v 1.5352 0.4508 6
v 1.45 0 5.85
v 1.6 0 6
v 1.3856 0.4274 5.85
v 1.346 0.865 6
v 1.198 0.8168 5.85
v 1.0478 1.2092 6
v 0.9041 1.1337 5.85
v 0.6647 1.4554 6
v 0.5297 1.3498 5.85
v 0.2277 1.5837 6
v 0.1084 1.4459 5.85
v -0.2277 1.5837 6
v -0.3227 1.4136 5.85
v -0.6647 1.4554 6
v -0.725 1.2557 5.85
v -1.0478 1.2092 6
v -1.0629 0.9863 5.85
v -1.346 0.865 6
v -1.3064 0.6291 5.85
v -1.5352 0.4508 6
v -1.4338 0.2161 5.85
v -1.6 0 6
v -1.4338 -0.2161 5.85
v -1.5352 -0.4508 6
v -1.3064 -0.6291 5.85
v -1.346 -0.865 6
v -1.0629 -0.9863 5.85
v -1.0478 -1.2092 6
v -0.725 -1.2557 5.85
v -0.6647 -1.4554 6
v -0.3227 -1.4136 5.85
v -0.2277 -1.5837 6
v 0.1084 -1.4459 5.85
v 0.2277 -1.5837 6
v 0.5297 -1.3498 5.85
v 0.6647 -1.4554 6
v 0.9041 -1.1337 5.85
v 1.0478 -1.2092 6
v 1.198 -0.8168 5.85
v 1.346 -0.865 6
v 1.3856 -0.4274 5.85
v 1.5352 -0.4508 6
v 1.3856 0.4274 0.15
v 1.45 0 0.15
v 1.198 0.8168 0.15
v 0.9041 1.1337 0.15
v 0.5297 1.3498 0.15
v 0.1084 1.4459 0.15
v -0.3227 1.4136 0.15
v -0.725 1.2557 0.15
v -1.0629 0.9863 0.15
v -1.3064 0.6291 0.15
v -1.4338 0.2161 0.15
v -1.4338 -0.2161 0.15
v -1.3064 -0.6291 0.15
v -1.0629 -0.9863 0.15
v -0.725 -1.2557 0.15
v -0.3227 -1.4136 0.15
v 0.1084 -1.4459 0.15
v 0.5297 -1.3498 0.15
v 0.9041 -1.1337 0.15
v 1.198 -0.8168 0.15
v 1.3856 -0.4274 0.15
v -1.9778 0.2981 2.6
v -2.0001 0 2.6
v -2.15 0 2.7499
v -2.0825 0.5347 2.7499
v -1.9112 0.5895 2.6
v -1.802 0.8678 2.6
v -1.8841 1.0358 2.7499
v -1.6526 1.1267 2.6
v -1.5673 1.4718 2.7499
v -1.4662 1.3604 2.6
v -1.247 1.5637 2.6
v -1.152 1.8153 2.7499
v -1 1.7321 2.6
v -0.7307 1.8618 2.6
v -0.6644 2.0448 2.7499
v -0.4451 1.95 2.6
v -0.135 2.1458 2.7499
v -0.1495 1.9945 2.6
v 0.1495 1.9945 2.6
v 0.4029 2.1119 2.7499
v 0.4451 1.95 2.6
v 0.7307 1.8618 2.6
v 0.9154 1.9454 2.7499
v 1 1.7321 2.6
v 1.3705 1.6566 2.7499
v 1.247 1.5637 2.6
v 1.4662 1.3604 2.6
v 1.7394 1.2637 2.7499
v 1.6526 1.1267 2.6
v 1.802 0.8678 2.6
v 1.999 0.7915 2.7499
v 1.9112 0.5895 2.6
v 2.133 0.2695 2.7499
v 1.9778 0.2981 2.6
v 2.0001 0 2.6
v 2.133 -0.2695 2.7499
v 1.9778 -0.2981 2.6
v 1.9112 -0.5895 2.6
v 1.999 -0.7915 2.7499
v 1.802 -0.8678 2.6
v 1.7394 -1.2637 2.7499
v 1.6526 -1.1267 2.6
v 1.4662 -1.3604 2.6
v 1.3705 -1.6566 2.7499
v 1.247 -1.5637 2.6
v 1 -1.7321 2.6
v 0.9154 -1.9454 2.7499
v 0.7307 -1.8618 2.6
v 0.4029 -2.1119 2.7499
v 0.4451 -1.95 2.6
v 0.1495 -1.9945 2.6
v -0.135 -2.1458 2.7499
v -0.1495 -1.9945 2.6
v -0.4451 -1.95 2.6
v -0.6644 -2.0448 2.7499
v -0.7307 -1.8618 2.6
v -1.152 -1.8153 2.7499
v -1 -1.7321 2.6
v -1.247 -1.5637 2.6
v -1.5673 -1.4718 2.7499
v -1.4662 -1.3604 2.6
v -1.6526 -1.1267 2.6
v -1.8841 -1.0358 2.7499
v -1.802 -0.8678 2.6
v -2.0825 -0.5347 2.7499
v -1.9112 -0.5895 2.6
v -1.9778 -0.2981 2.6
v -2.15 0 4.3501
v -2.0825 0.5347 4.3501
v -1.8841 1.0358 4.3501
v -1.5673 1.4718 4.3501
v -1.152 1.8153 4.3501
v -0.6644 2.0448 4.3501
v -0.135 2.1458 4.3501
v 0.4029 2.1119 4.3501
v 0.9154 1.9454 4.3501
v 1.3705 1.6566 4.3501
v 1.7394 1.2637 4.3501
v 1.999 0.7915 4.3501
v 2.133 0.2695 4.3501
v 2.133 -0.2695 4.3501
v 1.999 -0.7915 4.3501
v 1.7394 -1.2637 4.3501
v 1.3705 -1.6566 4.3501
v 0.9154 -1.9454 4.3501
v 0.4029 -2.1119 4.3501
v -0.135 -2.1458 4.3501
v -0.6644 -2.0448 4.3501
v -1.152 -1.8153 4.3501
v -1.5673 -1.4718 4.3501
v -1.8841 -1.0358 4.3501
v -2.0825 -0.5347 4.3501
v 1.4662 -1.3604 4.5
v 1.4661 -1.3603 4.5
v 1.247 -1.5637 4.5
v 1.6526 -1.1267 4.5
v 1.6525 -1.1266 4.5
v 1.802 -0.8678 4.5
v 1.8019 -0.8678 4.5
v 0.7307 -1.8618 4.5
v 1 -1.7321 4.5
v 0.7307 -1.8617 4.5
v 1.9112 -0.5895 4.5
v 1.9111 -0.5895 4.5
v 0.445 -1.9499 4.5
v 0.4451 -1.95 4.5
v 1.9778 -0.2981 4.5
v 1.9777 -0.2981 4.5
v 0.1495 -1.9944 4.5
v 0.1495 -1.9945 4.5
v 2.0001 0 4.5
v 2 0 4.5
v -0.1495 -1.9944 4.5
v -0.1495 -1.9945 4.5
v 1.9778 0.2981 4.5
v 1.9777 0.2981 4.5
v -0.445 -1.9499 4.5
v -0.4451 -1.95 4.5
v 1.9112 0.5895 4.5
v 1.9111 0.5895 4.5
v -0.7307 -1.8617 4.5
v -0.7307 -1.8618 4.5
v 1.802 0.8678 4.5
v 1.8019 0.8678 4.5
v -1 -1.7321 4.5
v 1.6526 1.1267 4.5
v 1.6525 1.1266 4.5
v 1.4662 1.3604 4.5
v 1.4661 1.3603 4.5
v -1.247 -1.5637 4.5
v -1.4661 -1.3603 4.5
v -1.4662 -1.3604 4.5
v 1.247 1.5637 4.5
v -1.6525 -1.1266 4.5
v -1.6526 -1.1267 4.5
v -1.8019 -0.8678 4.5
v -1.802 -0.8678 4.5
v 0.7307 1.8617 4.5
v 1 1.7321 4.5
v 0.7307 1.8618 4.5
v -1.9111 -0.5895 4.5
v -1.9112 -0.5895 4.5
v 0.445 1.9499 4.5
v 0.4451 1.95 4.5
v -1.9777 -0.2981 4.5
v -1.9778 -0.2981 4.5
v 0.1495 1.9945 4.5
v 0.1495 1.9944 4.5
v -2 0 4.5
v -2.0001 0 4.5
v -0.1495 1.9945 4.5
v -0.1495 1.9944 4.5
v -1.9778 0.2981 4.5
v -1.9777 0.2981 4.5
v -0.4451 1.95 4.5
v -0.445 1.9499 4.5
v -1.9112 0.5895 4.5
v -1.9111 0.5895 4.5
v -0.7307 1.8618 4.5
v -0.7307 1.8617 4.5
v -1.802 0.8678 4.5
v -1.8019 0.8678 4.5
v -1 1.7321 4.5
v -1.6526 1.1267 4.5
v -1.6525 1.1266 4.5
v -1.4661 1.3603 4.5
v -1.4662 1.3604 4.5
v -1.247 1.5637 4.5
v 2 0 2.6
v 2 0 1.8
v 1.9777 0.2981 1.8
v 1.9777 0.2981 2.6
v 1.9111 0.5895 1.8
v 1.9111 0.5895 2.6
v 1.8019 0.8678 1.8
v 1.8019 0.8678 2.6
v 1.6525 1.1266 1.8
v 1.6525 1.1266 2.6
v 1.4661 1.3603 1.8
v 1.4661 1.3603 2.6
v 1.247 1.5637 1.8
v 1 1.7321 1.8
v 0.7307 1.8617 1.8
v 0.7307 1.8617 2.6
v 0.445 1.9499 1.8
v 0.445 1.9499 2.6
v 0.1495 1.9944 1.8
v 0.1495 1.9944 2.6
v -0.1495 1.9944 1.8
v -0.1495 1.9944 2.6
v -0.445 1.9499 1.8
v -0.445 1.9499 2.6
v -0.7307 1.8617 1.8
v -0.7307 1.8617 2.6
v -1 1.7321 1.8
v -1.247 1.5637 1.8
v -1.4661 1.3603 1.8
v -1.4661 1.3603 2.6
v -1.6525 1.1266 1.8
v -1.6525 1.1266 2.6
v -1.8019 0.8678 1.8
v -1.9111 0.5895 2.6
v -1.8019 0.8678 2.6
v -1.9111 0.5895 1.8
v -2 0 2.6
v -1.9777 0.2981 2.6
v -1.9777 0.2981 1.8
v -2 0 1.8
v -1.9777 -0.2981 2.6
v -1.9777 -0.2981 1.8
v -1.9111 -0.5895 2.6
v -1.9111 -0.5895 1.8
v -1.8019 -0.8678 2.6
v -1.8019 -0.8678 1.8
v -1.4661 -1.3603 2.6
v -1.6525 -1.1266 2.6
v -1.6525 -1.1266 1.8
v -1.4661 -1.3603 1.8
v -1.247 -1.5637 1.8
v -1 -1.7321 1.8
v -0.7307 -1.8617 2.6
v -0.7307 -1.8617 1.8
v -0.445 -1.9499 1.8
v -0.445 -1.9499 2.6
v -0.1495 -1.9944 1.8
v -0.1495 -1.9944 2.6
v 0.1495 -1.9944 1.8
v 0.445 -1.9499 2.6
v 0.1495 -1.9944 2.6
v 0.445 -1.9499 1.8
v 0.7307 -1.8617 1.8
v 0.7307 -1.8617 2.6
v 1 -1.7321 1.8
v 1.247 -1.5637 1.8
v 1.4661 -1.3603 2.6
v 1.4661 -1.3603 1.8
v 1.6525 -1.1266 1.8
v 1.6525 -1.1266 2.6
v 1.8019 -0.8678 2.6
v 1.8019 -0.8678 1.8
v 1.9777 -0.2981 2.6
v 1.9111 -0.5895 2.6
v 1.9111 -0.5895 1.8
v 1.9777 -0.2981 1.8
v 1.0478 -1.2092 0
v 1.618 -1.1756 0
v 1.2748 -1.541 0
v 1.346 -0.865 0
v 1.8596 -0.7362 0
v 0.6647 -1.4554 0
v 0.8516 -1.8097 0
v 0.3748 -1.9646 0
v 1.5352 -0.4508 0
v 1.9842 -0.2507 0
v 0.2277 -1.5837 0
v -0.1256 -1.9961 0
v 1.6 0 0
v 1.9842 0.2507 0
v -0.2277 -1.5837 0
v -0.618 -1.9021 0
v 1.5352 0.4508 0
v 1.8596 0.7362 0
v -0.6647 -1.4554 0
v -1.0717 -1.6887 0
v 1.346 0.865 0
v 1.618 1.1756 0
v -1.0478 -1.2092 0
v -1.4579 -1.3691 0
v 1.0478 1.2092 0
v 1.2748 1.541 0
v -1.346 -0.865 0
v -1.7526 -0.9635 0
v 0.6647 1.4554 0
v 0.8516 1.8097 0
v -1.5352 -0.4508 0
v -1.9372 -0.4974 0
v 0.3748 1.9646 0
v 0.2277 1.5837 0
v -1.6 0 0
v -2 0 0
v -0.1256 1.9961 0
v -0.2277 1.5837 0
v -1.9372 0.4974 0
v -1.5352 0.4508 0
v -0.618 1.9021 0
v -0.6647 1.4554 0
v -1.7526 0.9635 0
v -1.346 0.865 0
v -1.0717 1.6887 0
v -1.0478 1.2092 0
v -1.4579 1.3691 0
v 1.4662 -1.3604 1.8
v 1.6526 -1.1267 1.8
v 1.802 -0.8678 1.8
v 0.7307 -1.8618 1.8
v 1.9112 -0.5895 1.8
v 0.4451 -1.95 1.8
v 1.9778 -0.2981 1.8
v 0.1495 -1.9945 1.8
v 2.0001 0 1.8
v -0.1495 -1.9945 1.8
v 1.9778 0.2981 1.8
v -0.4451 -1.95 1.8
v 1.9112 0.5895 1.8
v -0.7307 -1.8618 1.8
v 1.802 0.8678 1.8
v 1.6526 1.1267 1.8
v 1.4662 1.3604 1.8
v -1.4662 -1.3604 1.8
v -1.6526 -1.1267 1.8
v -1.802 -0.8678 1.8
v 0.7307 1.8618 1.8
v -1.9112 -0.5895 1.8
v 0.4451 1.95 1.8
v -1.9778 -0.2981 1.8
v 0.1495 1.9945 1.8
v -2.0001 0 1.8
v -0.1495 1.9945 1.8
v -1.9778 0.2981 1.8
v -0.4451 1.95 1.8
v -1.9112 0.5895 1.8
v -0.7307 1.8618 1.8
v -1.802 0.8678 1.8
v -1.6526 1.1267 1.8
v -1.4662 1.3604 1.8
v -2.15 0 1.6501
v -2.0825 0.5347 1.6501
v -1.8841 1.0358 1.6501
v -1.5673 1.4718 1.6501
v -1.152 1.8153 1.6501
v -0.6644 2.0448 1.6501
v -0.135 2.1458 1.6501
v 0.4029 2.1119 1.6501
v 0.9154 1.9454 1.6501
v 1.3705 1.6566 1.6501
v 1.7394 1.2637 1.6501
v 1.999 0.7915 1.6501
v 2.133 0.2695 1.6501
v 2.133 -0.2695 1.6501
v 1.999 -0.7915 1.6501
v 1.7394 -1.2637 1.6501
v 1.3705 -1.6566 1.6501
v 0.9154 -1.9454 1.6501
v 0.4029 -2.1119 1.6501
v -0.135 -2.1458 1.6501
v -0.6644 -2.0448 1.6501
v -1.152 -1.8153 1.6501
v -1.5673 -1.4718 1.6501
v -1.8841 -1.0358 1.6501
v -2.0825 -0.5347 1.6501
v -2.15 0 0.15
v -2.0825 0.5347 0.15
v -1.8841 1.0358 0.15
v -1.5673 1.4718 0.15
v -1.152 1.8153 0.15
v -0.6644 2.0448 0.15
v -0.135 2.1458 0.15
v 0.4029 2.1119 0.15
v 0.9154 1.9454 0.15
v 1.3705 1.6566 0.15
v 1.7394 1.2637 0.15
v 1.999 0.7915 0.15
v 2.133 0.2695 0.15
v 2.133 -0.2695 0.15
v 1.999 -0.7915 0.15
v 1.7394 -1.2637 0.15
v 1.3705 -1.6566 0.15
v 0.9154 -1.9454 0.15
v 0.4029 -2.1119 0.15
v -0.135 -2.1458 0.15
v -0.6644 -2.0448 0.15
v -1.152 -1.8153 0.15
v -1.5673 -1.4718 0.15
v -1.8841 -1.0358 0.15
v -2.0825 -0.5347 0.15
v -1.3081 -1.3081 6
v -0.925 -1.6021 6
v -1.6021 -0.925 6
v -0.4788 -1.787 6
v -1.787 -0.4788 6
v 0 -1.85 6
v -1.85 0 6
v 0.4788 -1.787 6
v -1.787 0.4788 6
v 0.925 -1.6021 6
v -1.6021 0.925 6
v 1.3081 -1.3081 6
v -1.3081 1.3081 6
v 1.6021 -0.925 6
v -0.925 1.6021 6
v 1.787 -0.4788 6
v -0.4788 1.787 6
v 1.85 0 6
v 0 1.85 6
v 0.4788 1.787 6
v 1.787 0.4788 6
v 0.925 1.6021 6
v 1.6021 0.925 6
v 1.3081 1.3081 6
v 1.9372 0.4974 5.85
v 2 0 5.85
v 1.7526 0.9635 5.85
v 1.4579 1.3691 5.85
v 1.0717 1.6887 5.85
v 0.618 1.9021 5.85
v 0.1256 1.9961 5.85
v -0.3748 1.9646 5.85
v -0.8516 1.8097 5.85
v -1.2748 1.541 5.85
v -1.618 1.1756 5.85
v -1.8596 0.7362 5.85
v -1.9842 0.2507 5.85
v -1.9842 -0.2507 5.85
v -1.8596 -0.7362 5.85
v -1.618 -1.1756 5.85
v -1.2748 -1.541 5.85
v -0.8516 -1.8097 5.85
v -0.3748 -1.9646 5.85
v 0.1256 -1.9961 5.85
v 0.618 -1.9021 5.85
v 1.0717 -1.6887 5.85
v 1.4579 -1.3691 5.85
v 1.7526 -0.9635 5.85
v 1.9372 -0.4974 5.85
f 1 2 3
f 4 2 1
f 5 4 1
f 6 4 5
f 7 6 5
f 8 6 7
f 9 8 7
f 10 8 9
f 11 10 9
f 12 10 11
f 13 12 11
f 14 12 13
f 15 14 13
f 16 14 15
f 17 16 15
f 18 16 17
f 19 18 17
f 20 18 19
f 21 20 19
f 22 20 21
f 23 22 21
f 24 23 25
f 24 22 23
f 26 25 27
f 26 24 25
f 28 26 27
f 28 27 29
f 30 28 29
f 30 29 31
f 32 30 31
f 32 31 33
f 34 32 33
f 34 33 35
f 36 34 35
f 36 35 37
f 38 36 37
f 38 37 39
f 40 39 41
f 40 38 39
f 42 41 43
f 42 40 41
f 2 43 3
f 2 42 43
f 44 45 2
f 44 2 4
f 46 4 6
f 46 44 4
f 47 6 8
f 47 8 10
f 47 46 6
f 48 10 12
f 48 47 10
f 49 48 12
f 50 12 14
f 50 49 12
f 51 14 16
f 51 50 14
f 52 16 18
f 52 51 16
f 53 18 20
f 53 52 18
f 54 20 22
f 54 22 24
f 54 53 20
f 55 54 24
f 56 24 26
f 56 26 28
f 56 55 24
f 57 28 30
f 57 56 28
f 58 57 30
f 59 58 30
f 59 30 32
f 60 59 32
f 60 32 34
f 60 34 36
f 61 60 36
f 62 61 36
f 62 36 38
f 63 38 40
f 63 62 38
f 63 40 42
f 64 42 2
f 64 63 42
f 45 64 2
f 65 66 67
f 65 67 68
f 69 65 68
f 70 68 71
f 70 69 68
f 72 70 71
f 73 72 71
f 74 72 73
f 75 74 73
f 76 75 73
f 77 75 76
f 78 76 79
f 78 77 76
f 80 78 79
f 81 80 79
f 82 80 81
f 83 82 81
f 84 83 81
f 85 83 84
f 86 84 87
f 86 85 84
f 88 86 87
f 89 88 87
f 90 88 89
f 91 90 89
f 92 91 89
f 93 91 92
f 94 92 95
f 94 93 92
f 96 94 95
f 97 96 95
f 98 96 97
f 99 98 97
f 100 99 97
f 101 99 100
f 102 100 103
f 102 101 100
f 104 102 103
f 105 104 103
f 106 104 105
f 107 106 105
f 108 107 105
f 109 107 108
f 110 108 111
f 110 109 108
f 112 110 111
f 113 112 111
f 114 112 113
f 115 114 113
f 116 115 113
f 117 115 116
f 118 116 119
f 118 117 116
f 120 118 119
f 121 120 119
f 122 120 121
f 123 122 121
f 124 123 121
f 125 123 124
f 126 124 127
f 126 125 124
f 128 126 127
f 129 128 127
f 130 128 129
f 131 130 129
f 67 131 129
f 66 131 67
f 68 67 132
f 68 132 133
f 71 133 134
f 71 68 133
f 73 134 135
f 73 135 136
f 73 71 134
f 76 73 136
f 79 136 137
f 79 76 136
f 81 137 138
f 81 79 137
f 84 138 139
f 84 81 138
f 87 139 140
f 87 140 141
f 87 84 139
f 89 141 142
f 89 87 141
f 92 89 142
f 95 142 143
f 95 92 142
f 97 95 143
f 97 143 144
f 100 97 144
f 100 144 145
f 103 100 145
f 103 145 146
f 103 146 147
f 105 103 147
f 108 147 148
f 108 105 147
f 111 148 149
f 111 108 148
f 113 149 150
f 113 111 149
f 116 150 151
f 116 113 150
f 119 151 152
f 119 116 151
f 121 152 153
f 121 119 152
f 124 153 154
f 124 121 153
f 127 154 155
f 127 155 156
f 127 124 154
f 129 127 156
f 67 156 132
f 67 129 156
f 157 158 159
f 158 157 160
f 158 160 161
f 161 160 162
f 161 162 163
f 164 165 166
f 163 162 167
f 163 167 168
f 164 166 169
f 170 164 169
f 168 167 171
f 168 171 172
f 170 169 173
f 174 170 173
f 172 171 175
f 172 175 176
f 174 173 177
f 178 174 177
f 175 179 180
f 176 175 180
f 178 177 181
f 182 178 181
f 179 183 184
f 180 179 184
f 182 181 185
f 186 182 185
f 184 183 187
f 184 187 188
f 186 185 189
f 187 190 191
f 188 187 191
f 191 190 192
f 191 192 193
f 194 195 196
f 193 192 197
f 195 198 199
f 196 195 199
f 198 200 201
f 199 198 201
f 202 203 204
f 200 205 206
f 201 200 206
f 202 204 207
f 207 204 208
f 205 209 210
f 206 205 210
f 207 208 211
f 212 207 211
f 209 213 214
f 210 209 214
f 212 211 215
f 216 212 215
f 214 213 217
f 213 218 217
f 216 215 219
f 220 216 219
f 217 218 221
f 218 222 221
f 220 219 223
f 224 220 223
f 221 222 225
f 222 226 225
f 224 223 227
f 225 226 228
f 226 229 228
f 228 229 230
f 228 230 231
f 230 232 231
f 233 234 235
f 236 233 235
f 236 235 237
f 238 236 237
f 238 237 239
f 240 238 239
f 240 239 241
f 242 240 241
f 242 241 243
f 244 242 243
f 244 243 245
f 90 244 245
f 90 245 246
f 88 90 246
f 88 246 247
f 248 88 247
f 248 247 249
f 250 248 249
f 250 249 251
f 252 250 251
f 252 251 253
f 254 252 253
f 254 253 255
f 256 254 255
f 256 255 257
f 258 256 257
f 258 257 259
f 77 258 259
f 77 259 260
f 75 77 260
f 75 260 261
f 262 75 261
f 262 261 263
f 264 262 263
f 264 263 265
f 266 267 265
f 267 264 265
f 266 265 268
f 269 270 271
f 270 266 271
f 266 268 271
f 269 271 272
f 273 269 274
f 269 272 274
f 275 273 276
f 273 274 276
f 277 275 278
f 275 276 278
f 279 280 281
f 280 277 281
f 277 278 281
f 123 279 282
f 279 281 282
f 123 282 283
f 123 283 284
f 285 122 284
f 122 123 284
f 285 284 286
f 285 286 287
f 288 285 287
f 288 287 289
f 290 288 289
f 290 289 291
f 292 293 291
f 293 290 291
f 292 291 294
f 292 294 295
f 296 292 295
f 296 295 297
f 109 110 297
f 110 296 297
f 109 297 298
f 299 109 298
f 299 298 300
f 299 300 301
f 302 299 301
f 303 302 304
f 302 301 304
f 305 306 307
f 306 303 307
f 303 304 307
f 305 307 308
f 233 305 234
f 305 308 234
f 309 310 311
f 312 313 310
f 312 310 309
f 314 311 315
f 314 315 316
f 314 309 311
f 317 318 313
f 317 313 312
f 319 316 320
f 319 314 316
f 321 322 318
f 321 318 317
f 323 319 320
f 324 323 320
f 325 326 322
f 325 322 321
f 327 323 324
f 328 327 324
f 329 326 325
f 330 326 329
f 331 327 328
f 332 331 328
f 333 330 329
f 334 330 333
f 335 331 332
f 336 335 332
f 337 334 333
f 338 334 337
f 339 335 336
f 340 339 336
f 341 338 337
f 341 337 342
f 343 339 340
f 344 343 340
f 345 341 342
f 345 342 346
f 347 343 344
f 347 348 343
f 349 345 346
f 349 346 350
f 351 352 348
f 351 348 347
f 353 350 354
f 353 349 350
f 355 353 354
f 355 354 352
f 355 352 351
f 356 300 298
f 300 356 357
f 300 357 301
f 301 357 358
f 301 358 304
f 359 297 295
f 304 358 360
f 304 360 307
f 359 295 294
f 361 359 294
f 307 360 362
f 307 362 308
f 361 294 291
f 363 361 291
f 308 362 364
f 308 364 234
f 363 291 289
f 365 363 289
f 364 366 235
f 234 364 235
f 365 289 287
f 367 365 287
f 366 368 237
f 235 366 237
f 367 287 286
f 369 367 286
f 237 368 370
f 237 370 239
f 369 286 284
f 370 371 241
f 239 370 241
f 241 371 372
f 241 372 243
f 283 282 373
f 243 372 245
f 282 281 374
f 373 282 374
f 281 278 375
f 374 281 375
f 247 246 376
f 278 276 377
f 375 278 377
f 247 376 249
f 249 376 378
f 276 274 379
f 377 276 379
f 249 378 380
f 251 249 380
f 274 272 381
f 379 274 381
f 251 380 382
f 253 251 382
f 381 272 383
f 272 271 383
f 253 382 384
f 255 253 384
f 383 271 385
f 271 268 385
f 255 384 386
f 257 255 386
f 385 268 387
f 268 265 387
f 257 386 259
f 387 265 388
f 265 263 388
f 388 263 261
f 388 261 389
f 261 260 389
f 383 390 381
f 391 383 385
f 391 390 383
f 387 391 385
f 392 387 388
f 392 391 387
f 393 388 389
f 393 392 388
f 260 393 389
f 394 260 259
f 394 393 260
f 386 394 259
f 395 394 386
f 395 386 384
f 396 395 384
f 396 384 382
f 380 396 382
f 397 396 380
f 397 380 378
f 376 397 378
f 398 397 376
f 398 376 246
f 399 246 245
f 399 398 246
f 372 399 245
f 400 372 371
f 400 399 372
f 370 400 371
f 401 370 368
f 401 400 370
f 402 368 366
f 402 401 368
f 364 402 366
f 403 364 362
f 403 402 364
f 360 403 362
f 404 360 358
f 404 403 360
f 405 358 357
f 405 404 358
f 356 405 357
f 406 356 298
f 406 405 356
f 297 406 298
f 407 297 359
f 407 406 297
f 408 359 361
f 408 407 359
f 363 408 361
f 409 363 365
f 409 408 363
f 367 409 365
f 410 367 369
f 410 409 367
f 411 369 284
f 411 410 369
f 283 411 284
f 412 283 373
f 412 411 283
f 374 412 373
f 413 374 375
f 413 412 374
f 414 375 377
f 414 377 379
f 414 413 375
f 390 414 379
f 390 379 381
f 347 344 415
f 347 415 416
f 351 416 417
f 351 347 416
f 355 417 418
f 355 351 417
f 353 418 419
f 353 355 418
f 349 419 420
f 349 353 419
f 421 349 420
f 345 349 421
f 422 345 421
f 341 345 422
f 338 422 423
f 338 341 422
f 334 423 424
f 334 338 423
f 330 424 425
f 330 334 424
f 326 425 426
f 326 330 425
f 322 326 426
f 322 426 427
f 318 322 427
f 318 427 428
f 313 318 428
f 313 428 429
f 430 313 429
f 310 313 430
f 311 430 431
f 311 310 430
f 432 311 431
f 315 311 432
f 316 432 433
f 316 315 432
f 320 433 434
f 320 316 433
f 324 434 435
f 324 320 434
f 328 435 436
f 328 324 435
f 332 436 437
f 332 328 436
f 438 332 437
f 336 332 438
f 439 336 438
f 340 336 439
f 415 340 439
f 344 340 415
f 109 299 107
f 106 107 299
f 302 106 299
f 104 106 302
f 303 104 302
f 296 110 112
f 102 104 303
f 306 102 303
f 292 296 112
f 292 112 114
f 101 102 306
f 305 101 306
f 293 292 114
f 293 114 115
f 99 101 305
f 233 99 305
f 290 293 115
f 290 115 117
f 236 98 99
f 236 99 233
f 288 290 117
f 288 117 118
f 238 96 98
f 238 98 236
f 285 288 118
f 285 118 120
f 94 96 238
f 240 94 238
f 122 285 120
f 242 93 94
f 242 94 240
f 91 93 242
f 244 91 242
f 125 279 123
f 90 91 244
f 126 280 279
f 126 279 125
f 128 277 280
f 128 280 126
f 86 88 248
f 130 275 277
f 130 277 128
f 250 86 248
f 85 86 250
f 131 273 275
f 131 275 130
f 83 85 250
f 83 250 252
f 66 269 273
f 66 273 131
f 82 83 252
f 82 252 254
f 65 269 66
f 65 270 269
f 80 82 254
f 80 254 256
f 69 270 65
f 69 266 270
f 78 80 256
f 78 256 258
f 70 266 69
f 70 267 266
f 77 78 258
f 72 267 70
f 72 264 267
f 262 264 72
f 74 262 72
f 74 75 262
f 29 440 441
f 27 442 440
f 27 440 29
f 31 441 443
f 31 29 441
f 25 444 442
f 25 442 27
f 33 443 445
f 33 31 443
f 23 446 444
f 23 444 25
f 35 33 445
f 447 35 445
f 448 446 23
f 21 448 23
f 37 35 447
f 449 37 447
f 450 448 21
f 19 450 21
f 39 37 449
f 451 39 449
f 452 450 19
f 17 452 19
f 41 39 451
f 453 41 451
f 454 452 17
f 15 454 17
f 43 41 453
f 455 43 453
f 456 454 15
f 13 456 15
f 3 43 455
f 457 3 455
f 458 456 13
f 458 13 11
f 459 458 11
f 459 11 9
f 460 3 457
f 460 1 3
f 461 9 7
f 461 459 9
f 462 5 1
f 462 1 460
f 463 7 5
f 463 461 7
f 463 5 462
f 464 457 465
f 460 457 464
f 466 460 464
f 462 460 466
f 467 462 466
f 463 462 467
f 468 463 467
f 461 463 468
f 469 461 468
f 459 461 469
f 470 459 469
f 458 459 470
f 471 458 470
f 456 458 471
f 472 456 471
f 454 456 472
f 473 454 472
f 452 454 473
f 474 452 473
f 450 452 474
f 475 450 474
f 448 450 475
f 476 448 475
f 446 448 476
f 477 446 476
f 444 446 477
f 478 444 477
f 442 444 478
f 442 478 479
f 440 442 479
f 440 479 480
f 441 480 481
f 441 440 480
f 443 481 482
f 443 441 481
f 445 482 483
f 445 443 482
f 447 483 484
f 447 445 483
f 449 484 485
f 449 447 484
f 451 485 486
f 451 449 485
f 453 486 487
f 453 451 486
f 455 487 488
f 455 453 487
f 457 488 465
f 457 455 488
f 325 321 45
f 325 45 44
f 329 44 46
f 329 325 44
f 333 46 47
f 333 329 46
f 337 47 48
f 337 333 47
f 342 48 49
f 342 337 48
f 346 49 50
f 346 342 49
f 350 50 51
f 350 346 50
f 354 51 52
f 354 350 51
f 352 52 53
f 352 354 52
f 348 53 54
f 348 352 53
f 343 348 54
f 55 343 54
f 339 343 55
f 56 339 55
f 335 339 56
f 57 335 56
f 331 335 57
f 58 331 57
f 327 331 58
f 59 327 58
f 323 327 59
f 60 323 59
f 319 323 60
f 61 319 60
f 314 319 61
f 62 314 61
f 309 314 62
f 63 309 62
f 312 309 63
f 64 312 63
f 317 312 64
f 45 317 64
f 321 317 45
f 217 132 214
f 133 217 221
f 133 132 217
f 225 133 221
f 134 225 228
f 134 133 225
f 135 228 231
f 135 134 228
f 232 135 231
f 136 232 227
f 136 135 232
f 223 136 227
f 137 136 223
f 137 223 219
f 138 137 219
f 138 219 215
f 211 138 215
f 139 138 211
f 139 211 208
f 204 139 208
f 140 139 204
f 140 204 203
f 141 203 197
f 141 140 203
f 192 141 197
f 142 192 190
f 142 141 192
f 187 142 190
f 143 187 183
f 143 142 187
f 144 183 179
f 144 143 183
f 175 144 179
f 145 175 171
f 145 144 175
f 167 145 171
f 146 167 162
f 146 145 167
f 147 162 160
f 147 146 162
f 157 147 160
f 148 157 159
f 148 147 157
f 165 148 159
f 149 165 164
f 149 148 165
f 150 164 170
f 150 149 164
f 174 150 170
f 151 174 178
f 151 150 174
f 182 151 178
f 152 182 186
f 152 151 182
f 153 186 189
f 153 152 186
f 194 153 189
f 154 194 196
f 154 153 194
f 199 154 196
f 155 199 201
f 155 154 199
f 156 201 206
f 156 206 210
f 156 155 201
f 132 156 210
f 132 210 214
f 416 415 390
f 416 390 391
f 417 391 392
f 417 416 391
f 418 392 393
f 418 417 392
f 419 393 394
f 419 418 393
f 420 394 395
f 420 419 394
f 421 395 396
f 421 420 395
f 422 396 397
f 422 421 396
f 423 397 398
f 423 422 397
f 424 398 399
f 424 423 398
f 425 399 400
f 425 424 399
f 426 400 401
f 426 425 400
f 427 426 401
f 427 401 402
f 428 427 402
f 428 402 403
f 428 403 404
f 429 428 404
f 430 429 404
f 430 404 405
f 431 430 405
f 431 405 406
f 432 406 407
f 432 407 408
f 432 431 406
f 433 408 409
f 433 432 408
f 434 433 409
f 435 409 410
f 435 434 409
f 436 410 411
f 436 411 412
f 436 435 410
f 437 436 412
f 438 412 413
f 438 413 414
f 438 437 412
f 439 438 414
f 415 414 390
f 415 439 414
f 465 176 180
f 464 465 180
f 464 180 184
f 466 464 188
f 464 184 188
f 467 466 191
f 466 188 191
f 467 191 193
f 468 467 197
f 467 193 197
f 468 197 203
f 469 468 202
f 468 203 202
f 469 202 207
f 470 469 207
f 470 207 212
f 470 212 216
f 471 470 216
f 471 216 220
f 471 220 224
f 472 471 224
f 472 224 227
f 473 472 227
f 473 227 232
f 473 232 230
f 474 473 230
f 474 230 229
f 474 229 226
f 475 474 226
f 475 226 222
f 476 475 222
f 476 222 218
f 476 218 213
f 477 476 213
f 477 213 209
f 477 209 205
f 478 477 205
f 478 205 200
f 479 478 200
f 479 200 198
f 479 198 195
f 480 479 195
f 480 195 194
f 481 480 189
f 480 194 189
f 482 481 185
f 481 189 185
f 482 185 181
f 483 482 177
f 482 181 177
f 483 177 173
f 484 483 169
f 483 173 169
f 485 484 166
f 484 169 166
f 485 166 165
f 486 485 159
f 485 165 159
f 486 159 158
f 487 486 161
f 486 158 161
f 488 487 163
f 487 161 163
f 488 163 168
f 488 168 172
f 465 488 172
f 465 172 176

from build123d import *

# Parameters (mm, degrees)
SKIZZE1_R                       = 2
SKIZZE1_R_2                     = 1.45
AUFSATZ_LINEAR_AUSTRAGEN1_DEPTH = 6
SKIZZE2_R                       = 2.15
SKIZZE2_R_2                     = 1.755690243
AUFSATZ_LINEAR_AUSTRAGEN2_DEPTH = 1.8
AUFSATZ_LINEAR_START            = -2.6
SKIZZE2_2_R                     = 2.15
SKIZZE2_2_R_2                   = 1.755690243
AUFSATZ_LINEAR_AUSTRAGEN3_DEPTH = 1.9
FASE1_SIZE                      = 0.15
FASE2_SIZE                      = 0.15


with BuildPart() as part:
    # Skizze1 → Aufsatz-Linear austragen1 (new body)
    with BuildSketch(Plane.XY):
        Circle(SKIZZE1_R)
        Circle(SKIZZE1_R_2, mode=Mode.SUBTRACT)
    extrude(amount=AUFSATZ_LINEAR_AUSTRAGEN1_DEPTH)

    # Skizze2 → Aufsatz-Linear austragen2 (add)
    with BuildSketch(Plane(origin=(0, 0, 0), x_dir=(-1, 0, 0), z_dir=(0, 0, -1))):
        Circle(SKIZZE2_R)
        Circle(SKIZZE2_R_2, mode=Mode.SUBTRACT)
    extrude(amount=-AUFSATZ_LINEAR_AUSTRAGEN2_DEPTH)

    # Skizze2<2> → Aufsatz-Linear austragen3 (add)
    with BuildSketch(Plane(origin=(0, 0, 0), x_dir=(-1, 0, 0), z_dir=(0, 0, -1)).offset(AUFSATZ_LINEAR_START)):
        Circle(SKIZZE2_2_R)
        Circle(SKIZZE2_2_R_2, mode=Mode.SUBTRACT)
    extrude(amount=-AUFSATZ_LINEAR_AUSTRAGEN3_DEPTH)

    # Fase1
    fase1_edges = [part.edges().sort_by_distance(p)[0] for p in [
        (2.15, 0, 0),
        (-2, 0, 6),
        (-1.45, 0, 0),
        (-1.45, 0, 6),
    ]]
    chamfer(fase1_edges, length=FASE1_SIZE)

    # Fase2
    fase2_edges = [part.edges().sort_by_distance(p)[0] for p in [
        (2.15, 0, 1.8),
        (2.15, 0, 4.5),
        (2.15, 0, 2.6),
    ]]
    chamfer(fase2_edges, length=FASE2_SIZE - 0.0001)  # a hair under: the kernel refuses the full size


solid = part.part
